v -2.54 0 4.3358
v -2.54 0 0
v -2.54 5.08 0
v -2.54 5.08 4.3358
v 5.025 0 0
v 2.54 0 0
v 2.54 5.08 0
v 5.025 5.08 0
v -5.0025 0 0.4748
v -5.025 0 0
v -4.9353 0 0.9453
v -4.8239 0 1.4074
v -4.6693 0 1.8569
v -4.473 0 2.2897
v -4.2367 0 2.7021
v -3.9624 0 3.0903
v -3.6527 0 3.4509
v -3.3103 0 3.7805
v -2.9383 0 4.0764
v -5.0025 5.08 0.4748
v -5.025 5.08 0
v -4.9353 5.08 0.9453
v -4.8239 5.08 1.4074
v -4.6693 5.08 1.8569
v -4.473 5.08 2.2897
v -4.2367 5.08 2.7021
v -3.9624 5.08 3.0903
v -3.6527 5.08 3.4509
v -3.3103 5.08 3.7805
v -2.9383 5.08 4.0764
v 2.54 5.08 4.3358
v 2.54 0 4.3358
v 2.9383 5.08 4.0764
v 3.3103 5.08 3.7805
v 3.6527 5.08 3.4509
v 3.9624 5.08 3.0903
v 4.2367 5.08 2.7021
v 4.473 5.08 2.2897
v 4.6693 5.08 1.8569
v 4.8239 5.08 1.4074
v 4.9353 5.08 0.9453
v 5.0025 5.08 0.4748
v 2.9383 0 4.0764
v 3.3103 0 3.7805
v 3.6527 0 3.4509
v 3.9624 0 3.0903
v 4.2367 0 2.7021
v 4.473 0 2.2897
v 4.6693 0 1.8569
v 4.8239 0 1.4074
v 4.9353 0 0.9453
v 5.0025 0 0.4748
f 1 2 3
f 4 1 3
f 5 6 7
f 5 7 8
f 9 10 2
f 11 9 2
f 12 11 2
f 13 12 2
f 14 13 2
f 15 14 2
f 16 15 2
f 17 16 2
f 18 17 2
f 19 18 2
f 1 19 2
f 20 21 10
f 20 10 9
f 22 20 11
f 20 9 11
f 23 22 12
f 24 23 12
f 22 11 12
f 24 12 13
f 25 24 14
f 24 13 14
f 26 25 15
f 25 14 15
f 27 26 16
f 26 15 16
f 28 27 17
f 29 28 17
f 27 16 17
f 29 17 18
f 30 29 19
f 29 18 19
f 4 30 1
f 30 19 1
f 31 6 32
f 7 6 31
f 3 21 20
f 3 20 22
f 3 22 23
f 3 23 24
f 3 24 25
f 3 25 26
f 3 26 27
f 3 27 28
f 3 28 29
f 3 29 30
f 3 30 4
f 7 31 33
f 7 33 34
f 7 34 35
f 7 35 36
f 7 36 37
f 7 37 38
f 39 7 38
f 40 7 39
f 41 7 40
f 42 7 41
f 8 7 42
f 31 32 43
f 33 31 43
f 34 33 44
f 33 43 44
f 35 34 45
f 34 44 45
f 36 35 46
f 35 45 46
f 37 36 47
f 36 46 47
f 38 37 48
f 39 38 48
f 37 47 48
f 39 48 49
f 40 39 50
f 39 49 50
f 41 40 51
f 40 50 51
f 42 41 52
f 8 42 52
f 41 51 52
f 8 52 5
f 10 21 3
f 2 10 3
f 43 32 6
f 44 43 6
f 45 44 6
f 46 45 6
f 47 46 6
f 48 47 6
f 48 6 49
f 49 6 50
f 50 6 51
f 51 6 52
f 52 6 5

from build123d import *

# Parameters (mm, degrees)
SKETCH1_R           = 5.025
BOSS_EXTRUDE1_DEPTH = 5.08
SKETCH2_W           = 277.946121386
SKETCH2_H           = 253.043274965
CUT_EXTRUDE1_DEPTH  = 5.08
SKETCH3_W           = 5.08
SKETCH3_H           = 5.08
CUT_EXTRUDE2_DEPTH  = 10


with BuildPart() as part:
    # Sketch1 → Boss-Extrude1 (new body)
    with BuildSketch(Plane(origin=(0, 0, 0), x_dir=(1, 0, 0), z_dir=(0, 1, 0))):
        Circle(SKETCH1_R)
    extrude(amount=BOSS_EXTRUDE1_DEPTH)

    # Sketch2 → Cut-Extrude1 (cut)
    with BuildSketch(Plane(origin=(0, 5.08, 0), x_dir=(1, 0, 0), z_dir=(0, 1, 0))):
        with Locations((-133.948060693, 126.521637483)):
            Rectangle(SKETCH2_W, SKETCH2_H)
    extrude(amount=-CUT_EXTRUDE1_DEPTH, mode=Mode.SUBTRACT)

    # Sketch3 → Cut-Extrude2 (cut)
    with BuildSketch(Plane(origin=(0, 0, 0), x_dir=(-1, 0, 0), z_dir=(0, 0, -1))):
        with Locations((0, 2.54)):
            Rectangle(SKETCH3_W, SKETCH3_H)
    extrude(amount=-CUT_EXTRUDE2_DEPTH, mode=Mode.SUBTRACT)


solid = part.part
